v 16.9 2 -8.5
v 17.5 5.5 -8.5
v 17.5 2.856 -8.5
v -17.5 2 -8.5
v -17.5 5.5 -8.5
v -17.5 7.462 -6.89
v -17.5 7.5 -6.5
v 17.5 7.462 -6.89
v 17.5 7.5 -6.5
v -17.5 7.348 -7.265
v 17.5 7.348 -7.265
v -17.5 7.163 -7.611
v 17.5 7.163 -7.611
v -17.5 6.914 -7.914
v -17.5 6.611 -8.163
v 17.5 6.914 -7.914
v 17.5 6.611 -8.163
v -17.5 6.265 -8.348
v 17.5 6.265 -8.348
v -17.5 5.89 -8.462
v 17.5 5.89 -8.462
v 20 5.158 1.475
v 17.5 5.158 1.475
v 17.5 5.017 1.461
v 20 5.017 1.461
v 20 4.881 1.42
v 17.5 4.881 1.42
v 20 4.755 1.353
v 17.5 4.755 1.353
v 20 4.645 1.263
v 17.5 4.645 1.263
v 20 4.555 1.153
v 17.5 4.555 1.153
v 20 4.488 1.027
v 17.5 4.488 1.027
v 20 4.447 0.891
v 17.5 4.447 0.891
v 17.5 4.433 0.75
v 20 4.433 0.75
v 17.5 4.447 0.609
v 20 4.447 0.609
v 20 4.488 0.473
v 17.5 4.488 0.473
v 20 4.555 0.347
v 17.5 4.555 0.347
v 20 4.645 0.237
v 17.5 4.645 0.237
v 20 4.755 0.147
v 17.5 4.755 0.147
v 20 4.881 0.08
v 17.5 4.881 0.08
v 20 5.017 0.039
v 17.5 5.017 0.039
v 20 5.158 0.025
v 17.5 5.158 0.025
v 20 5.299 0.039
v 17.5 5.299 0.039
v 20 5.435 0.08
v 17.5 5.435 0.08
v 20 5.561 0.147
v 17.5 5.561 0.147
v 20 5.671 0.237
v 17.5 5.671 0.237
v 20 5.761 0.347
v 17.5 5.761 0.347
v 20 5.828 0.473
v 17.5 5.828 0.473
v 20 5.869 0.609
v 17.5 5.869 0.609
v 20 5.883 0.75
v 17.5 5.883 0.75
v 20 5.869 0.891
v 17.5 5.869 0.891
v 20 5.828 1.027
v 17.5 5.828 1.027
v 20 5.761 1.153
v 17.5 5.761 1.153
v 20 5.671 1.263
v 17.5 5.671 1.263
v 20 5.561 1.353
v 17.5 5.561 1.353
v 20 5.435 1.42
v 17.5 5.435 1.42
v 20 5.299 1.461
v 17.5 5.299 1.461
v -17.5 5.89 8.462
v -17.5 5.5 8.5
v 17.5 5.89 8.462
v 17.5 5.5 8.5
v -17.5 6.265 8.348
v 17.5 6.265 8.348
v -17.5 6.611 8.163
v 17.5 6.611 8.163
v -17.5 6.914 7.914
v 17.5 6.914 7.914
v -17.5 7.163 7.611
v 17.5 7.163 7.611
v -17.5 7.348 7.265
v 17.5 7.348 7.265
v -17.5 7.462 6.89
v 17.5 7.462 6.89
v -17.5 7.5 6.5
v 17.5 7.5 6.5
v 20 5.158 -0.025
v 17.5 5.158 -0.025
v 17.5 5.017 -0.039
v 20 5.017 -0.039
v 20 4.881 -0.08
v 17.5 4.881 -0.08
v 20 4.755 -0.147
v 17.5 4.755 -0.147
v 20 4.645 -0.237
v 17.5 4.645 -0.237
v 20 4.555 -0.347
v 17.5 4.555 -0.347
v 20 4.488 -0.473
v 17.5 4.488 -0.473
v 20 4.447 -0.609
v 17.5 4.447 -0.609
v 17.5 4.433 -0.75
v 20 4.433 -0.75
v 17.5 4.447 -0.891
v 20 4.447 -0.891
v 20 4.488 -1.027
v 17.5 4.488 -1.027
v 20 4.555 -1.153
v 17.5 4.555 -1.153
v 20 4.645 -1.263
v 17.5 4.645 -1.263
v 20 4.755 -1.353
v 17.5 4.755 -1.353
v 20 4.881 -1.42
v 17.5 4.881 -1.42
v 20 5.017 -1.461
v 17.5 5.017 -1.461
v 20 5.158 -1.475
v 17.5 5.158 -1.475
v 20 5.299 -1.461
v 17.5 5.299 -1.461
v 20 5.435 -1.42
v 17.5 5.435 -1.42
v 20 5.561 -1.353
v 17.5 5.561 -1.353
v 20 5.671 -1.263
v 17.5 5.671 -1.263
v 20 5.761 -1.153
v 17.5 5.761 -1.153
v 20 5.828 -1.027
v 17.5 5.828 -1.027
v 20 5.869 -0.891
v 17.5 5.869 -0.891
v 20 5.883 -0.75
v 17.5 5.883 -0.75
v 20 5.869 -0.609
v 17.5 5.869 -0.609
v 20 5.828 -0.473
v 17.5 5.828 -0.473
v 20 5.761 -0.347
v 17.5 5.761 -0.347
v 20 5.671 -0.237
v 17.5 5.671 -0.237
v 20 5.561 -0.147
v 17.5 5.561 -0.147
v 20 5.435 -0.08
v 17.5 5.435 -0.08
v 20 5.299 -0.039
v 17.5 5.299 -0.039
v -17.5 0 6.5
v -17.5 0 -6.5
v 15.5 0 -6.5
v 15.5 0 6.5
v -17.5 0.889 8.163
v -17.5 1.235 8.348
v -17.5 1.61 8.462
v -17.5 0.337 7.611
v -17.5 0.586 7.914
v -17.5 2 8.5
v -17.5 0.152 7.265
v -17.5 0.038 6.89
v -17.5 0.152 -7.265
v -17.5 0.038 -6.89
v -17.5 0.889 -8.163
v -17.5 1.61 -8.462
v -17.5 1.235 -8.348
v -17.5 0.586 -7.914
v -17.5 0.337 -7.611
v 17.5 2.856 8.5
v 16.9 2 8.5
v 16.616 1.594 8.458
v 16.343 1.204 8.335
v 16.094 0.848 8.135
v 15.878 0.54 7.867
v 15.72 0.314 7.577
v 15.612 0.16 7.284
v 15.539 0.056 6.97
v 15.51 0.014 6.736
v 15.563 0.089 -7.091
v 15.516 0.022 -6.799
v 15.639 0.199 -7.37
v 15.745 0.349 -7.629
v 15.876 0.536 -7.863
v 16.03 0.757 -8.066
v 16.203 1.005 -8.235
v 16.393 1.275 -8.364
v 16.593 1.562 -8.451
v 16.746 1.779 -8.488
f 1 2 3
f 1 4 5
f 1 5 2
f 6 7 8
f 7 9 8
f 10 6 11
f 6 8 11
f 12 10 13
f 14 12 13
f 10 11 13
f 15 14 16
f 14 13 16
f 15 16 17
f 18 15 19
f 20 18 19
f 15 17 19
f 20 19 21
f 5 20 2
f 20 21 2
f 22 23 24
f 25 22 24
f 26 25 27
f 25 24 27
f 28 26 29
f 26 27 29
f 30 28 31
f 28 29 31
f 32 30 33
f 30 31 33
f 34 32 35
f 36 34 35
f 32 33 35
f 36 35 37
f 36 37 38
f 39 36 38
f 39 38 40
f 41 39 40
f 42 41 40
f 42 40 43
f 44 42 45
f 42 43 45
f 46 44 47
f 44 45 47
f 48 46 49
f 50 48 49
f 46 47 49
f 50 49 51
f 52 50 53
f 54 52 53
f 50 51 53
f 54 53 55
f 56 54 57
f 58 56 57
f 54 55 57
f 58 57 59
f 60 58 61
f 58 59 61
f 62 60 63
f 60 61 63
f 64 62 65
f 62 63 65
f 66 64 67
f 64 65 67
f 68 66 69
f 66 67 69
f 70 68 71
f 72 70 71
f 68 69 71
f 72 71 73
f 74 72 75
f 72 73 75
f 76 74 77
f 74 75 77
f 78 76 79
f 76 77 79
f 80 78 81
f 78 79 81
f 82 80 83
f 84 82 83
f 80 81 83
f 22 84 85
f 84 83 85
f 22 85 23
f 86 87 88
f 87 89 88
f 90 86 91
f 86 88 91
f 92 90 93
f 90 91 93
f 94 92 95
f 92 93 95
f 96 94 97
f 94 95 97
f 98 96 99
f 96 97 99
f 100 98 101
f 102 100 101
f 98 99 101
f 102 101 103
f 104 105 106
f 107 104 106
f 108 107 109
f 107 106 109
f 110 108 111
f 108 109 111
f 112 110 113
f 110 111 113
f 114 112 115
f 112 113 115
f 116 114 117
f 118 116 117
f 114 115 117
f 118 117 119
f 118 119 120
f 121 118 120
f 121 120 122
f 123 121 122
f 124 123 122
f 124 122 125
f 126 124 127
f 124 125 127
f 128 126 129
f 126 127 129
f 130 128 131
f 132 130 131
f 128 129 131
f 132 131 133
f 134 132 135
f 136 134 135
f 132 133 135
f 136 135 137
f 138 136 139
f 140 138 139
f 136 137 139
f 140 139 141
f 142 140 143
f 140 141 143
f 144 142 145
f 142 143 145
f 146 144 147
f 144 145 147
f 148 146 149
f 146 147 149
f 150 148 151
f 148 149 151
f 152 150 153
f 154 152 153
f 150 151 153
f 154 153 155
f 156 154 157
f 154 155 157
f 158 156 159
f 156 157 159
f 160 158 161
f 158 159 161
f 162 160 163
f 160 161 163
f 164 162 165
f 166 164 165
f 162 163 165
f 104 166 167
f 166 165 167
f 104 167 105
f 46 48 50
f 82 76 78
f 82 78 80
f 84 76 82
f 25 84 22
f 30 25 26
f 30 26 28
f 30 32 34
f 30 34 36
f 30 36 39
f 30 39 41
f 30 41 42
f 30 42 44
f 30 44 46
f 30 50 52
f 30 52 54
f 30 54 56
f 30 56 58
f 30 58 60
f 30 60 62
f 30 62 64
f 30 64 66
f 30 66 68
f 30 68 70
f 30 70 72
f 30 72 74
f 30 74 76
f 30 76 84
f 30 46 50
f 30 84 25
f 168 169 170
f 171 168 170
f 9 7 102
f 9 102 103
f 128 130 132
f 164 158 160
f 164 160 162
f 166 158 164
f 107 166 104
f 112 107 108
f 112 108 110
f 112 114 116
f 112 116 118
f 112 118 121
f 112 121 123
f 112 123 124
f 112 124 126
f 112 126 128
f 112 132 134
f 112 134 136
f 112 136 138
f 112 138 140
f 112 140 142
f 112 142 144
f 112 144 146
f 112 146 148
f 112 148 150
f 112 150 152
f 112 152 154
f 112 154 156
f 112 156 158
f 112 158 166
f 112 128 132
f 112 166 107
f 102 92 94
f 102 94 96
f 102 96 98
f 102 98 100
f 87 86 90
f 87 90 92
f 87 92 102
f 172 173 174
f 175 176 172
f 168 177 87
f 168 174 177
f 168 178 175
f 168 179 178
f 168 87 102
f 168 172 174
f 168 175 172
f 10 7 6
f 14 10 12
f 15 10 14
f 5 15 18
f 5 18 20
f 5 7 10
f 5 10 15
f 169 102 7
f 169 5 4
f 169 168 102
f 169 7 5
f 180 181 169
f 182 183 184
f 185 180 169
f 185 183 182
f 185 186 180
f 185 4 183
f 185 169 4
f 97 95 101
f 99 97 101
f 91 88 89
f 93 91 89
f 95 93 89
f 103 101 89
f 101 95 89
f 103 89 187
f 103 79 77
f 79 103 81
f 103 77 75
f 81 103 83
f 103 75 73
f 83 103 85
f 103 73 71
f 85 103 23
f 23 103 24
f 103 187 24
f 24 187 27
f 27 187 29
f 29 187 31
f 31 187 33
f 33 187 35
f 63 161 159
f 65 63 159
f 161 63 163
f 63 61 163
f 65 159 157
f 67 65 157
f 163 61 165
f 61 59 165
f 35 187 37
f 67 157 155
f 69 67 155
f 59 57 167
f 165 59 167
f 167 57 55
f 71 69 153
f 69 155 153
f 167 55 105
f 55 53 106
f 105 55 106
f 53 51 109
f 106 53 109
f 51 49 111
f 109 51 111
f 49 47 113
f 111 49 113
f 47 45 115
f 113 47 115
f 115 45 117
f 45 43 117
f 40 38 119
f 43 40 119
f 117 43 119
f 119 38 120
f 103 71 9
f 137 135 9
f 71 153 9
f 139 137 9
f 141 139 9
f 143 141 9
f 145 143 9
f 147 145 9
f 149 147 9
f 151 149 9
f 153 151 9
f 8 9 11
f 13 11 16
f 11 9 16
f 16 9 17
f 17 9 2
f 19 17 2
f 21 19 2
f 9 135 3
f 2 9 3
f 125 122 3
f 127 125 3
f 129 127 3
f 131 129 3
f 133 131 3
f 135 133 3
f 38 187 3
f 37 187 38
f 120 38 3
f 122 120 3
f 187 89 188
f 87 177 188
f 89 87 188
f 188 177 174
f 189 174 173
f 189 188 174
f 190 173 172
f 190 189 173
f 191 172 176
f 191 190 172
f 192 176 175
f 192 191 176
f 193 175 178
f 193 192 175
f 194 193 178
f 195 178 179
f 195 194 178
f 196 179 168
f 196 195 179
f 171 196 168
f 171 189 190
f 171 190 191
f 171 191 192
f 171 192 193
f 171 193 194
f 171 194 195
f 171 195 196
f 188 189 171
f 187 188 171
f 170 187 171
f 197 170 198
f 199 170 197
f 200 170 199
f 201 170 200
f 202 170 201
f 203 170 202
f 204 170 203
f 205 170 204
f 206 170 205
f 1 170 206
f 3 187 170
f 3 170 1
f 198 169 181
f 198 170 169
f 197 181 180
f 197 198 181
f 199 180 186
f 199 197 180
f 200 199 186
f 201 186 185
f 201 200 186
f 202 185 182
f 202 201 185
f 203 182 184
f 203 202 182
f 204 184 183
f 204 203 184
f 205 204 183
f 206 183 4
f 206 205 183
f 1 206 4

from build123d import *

# Parameters (mm, degrees)
SKETCH1_W           = 35
SKETCH1_H           = 17
BOSS_EXTRUDE1_DEPTH = 7.5
CHAMFER1_SIZE       = 2
CHAMFER1_SIZE2      = 2.856296013
FILLET1_R           = 2
SKETCH3_R           = 0.725
BOSS_EXTRUDE2_DEPTH = 2.5


with BuildPart() as part:
    # Sketch1 → Boss-Extrude1 (new body)
    with BuildSketch(Plane(origin=(0, 0, 0), x_dir=(1, 0, 0), z_dir=(0, 1, 0))):
        Rectangle(SKETCH1_W, SKETCH1_H)
    extrude(amount=BOSS_EXTRUDE1_DEPTH)

    # Chamfer1
    chamfer1_edges = [part.edges().sort_by_distance(p)[0] for p in [
        (17.5, 0, 0),
    ]]
    chamfer1_side = [part.faces().sort_by_distance(p)[0] for p in [
        (0, 0, 0),
    ]]
    chamfer(chamfer1_edges, length=CHAMFER1_SIZE, length2=CHAMFER1_SIZE2, reference=chamfer1_side[0])

    # Fillet1
    fillet1_edges = [part.edges().sort_by_distance(p)[0] for p in [
        (-1, 0, -8.5),
        (0, 7.5, 8.5),
        (-1, 0, 8.5),
        (0, 7.5, -8.5),
    ]]
    fillet(fillet1_edges, radius=FILLET1_R)

    # Sketch3 → Boss-Extrude2 (add)
    with BuildSketch(Plane(origin=(17.5, 0, 0), x_dir=(0, 0, -1), z_dir=(1, 0, 0))):
        with Locations(Location((-0.75, 5.157979839, 0), (0, 0, 180))):
            Circle(SKETCH3_R)
        with Locations(Location((0.75, 5.157979839, 0), (0, 0, 180))):
            Circle(SKETCH3_R)
    extrude(amount=BOSS_EXTRUDE2_DEPTH)


solid = part.part
